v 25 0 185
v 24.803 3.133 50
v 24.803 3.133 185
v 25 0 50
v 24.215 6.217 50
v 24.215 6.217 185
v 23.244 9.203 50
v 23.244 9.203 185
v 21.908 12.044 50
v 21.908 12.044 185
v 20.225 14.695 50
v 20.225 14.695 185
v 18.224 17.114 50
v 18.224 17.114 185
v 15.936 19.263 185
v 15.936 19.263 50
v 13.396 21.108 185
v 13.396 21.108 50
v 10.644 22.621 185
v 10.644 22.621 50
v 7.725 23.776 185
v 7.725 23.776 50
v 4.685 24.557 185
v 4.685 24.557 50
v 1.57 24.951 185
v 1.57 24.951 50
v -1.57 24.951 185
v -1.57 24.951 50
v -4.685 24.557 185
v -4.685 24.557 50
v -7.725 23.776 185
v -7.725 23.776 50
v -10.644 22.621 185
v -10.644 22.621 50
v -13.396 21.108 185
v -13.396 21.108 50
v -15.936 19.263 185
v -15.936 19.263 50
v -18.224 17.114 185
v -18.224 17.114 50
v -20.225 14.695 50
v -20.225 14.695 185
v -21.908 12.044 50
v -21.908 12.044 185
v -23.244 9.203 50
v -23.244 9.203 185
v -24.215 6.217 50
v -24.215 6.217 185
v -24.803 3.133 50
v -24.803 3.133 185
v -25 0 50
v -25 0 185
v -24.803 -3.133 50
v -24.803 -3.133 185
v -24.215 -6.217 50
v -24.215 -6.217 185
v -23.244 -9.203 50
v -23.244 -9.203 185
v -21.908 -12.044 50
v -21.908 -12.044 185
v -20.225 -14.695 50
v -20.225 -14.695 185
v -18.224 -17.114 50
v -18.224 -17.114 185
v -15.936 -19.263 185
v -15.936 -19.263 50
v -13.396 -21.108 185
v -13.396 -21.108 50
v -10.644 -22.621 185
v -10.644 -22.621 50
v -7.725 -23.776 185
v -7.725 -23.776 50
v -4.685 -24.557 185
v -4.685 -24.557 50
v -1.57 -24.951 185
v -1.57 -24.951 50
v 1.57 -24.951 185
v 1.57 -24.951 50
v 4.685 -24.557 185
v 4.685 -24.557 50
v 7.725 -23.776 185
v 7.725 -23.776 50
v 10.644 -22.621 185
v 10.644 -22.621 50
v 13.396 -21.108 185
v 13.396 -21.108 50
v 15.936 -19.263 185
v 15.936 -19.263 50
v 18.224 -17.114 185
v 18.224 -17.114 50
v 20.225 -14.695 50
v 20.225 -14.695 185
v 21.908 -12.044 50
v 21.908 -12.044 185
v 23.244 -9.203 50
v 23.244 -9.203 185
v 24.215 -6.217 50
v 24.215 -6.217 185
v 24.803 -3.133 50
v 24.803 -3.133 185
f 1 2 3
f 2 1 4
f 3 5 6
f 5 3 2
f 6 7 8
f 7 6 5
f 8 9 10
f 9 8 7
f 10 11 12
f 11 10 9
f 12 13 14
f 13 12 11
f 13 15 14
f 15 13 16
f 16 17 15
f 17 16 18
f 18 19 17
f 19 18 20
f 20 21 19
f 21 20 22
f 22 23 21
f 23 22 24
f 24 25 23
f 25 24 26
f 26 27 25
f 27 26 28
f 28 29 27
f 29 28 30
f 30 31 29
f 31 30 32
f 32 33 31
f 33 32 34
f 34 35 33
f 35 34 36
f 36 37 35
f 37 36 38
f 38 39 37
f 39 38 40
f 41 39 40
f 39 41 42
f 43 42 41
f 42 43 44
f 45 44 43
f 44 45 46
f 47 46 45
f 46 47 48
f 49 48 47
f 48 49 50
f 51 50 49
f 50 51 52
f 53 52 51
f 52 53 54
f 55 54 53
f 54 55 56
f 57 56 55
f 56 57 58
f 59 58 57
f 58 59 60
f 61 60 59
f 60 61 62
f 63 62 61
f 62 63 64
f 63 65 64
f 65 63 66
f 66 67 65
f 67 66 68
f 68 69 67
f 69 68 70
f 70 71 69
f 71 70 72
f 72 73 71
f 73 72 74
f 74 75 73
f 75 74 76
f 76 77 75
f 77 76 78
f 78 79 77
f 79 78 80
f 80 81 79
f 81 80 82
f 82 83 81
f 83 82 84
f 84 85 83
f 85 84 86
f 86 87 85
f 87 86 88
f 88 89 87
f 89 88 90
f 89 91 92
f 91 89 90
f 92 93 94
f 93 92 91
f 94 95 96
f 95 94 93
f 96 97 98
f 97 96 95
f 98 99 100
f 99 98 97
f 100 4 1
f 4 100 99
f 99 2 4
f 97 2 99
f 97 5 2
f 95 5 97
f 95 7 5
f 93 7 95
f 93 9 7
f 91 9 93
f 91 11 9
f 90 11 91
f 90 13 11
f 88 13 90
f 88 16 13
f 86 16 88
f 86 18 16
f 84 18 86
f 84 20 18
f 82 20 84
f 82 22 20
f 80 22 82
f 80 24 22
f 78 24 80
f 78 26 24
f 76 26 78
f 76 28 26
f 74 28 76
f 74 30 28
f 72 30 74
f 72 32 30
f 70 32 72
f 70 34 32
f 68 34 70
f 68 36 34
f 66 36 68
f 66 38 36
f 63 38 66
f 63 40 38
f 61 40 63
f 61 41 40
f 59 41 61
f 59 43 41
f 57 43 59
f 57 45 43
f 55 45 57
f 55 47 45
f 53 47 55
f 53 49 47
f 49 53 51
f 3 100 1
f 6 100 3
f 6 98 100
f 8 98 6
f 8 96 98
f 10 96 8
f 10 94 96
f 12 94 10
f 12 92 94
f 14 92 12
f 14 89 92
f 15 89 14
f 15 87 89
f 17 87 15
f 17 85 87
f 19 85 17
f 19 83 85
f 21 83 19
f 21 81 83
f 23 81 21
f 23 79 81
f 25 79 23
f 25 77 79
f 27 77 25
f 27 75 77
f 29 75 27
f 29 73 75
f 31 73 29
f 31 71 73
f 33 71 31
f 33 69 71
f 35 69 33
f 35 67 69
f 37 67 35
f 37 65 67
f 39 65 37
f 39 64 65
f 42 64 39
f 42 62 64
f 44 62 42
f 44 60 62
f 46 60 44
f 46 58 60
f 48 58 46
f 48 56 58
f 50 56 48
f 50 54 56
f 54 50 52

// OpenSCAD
// file: global_parameters.scad
radius = 50 / 2;
clear = 0.175;

wall = 1.2;
rib_wall = 0.6;

connection_lenght = radius*2;

resolution = 50;
// file: library.scad
module ring(radius, width, height) {
	difference () {
		cylinder(r = radius, h = height);
		translate([0, 0, -1])
		cylinder(r = radius - width, h = height + 2);
	}
}


module ccube(width, depth, height, z_center = false) {
	if (z_center) {
		translate([-width / 2, -depth / 2, -height / 2])
		cube([width, depth, height]);
	} else {
		translate([-width / 2, -depth / 2, 0])
		cube([width, depth, height]);
	}
}

module twisted_ribs(outer_r, inner_r, height, twist, count, wall) {
	angle = 360 / count;
	linear_extrude(height, twist = twist, slices = 20) {
		for (i = [0 : (count - 1)]) {
			rotate([0, 0, i * angle])
			translate([0, inner_r])
			square([wall, outer_r - inner_r]);
		}
	}
}

ccube(100, 100, 10);
ring(50, 5, 20);
ring(50, 2, 30);
// main file
use <library.scad>
include <global_parameters.scad>


inner_radius = radius - 5;
height = 185;
motor_top = 173;
motor_bottom = 10;

rib_count = 18;

// circular grid fins
/*
fin_r = 50;
fin_h = 5;
fin_spacing = 10;
*/

// classic fins
fin_r = radius + 50;
fin_h = 60;
fin_angle = 16;

screw_outer_r = 2.5;
screw_inner_r = 1;
screw_length = 10;
/*
difference () {                 // hull shell
    cylinder(r = radius, h = connection_lenght , $fn=resolution);
    cylinder(r = radius - wall, h = connection_lenght, $fn=resolution);
}

translate([0, 0, connection_lenght - clear ]){   // remove ribs to place stage connection section
    difference () {                 // hull shell
        cylinder(r = radius, h = height - 2*connection_lenght , $fn=resolution);
        cylinder(r = radius - rib_wall, h = height - 2*connection_lenght, $fn=resolution);
    }

    difference () {
            union () {
                    twisted_ribs(
                            radius - (wall / 2),
                            inner_radius,
                            height-connection_lenght,
                            90,
                            rib_count,
                            rib_wall
                    );						
            }
            
            cylinder(r1 = radius - wall, r2 = inner_radius, h = 15 ); // bevel inner ribs for better printing.
            
    // connection to the next rocket stage
            translate([0, 0, height - 2*connection_lenght])   // remove ribs to place stage connection section
            difference () {                
                    cylinder(r = radius, h = connection_lenght , $fn=resolution);
                    cylinder(r = radius- 1.5*rib_wall, h = connection_lenght, $fn=resolution);
            }
    }
}

translate([0, 0, height - connection_lenght])
difference () {                 // hull shell of connection part.
        cylinder(r = radius - rib_wall - clear, h = connection_lenght , $fn=resolution);
        cylinder(r = radius - 2*rib_wall - clear, h = connection_lenght, $fn=resolution);
}

translate([0, 0, height - connection_lenght - 2*rib_wall])        
difference () {                
    cylinder(               // bevel/smooth transformation between connection and rest of the rocket hull 
            r = radius,
            h = 2*rib_wall,
            $fn=resolution
    );

    cylinder(               // bevel/smooth transformation between connection and rest of the rocket hull 
            r1 = radius - rib_wall,
            r2 = radius - 2*rib_wall ,
            h = 2*rib_wall,
            $fn=resolution
    );
}
*/

// object modifier
translate([0, 0, connection_lenght])
cylinder(r = radius, h = height - connection_lenght , $fn=resolution);
